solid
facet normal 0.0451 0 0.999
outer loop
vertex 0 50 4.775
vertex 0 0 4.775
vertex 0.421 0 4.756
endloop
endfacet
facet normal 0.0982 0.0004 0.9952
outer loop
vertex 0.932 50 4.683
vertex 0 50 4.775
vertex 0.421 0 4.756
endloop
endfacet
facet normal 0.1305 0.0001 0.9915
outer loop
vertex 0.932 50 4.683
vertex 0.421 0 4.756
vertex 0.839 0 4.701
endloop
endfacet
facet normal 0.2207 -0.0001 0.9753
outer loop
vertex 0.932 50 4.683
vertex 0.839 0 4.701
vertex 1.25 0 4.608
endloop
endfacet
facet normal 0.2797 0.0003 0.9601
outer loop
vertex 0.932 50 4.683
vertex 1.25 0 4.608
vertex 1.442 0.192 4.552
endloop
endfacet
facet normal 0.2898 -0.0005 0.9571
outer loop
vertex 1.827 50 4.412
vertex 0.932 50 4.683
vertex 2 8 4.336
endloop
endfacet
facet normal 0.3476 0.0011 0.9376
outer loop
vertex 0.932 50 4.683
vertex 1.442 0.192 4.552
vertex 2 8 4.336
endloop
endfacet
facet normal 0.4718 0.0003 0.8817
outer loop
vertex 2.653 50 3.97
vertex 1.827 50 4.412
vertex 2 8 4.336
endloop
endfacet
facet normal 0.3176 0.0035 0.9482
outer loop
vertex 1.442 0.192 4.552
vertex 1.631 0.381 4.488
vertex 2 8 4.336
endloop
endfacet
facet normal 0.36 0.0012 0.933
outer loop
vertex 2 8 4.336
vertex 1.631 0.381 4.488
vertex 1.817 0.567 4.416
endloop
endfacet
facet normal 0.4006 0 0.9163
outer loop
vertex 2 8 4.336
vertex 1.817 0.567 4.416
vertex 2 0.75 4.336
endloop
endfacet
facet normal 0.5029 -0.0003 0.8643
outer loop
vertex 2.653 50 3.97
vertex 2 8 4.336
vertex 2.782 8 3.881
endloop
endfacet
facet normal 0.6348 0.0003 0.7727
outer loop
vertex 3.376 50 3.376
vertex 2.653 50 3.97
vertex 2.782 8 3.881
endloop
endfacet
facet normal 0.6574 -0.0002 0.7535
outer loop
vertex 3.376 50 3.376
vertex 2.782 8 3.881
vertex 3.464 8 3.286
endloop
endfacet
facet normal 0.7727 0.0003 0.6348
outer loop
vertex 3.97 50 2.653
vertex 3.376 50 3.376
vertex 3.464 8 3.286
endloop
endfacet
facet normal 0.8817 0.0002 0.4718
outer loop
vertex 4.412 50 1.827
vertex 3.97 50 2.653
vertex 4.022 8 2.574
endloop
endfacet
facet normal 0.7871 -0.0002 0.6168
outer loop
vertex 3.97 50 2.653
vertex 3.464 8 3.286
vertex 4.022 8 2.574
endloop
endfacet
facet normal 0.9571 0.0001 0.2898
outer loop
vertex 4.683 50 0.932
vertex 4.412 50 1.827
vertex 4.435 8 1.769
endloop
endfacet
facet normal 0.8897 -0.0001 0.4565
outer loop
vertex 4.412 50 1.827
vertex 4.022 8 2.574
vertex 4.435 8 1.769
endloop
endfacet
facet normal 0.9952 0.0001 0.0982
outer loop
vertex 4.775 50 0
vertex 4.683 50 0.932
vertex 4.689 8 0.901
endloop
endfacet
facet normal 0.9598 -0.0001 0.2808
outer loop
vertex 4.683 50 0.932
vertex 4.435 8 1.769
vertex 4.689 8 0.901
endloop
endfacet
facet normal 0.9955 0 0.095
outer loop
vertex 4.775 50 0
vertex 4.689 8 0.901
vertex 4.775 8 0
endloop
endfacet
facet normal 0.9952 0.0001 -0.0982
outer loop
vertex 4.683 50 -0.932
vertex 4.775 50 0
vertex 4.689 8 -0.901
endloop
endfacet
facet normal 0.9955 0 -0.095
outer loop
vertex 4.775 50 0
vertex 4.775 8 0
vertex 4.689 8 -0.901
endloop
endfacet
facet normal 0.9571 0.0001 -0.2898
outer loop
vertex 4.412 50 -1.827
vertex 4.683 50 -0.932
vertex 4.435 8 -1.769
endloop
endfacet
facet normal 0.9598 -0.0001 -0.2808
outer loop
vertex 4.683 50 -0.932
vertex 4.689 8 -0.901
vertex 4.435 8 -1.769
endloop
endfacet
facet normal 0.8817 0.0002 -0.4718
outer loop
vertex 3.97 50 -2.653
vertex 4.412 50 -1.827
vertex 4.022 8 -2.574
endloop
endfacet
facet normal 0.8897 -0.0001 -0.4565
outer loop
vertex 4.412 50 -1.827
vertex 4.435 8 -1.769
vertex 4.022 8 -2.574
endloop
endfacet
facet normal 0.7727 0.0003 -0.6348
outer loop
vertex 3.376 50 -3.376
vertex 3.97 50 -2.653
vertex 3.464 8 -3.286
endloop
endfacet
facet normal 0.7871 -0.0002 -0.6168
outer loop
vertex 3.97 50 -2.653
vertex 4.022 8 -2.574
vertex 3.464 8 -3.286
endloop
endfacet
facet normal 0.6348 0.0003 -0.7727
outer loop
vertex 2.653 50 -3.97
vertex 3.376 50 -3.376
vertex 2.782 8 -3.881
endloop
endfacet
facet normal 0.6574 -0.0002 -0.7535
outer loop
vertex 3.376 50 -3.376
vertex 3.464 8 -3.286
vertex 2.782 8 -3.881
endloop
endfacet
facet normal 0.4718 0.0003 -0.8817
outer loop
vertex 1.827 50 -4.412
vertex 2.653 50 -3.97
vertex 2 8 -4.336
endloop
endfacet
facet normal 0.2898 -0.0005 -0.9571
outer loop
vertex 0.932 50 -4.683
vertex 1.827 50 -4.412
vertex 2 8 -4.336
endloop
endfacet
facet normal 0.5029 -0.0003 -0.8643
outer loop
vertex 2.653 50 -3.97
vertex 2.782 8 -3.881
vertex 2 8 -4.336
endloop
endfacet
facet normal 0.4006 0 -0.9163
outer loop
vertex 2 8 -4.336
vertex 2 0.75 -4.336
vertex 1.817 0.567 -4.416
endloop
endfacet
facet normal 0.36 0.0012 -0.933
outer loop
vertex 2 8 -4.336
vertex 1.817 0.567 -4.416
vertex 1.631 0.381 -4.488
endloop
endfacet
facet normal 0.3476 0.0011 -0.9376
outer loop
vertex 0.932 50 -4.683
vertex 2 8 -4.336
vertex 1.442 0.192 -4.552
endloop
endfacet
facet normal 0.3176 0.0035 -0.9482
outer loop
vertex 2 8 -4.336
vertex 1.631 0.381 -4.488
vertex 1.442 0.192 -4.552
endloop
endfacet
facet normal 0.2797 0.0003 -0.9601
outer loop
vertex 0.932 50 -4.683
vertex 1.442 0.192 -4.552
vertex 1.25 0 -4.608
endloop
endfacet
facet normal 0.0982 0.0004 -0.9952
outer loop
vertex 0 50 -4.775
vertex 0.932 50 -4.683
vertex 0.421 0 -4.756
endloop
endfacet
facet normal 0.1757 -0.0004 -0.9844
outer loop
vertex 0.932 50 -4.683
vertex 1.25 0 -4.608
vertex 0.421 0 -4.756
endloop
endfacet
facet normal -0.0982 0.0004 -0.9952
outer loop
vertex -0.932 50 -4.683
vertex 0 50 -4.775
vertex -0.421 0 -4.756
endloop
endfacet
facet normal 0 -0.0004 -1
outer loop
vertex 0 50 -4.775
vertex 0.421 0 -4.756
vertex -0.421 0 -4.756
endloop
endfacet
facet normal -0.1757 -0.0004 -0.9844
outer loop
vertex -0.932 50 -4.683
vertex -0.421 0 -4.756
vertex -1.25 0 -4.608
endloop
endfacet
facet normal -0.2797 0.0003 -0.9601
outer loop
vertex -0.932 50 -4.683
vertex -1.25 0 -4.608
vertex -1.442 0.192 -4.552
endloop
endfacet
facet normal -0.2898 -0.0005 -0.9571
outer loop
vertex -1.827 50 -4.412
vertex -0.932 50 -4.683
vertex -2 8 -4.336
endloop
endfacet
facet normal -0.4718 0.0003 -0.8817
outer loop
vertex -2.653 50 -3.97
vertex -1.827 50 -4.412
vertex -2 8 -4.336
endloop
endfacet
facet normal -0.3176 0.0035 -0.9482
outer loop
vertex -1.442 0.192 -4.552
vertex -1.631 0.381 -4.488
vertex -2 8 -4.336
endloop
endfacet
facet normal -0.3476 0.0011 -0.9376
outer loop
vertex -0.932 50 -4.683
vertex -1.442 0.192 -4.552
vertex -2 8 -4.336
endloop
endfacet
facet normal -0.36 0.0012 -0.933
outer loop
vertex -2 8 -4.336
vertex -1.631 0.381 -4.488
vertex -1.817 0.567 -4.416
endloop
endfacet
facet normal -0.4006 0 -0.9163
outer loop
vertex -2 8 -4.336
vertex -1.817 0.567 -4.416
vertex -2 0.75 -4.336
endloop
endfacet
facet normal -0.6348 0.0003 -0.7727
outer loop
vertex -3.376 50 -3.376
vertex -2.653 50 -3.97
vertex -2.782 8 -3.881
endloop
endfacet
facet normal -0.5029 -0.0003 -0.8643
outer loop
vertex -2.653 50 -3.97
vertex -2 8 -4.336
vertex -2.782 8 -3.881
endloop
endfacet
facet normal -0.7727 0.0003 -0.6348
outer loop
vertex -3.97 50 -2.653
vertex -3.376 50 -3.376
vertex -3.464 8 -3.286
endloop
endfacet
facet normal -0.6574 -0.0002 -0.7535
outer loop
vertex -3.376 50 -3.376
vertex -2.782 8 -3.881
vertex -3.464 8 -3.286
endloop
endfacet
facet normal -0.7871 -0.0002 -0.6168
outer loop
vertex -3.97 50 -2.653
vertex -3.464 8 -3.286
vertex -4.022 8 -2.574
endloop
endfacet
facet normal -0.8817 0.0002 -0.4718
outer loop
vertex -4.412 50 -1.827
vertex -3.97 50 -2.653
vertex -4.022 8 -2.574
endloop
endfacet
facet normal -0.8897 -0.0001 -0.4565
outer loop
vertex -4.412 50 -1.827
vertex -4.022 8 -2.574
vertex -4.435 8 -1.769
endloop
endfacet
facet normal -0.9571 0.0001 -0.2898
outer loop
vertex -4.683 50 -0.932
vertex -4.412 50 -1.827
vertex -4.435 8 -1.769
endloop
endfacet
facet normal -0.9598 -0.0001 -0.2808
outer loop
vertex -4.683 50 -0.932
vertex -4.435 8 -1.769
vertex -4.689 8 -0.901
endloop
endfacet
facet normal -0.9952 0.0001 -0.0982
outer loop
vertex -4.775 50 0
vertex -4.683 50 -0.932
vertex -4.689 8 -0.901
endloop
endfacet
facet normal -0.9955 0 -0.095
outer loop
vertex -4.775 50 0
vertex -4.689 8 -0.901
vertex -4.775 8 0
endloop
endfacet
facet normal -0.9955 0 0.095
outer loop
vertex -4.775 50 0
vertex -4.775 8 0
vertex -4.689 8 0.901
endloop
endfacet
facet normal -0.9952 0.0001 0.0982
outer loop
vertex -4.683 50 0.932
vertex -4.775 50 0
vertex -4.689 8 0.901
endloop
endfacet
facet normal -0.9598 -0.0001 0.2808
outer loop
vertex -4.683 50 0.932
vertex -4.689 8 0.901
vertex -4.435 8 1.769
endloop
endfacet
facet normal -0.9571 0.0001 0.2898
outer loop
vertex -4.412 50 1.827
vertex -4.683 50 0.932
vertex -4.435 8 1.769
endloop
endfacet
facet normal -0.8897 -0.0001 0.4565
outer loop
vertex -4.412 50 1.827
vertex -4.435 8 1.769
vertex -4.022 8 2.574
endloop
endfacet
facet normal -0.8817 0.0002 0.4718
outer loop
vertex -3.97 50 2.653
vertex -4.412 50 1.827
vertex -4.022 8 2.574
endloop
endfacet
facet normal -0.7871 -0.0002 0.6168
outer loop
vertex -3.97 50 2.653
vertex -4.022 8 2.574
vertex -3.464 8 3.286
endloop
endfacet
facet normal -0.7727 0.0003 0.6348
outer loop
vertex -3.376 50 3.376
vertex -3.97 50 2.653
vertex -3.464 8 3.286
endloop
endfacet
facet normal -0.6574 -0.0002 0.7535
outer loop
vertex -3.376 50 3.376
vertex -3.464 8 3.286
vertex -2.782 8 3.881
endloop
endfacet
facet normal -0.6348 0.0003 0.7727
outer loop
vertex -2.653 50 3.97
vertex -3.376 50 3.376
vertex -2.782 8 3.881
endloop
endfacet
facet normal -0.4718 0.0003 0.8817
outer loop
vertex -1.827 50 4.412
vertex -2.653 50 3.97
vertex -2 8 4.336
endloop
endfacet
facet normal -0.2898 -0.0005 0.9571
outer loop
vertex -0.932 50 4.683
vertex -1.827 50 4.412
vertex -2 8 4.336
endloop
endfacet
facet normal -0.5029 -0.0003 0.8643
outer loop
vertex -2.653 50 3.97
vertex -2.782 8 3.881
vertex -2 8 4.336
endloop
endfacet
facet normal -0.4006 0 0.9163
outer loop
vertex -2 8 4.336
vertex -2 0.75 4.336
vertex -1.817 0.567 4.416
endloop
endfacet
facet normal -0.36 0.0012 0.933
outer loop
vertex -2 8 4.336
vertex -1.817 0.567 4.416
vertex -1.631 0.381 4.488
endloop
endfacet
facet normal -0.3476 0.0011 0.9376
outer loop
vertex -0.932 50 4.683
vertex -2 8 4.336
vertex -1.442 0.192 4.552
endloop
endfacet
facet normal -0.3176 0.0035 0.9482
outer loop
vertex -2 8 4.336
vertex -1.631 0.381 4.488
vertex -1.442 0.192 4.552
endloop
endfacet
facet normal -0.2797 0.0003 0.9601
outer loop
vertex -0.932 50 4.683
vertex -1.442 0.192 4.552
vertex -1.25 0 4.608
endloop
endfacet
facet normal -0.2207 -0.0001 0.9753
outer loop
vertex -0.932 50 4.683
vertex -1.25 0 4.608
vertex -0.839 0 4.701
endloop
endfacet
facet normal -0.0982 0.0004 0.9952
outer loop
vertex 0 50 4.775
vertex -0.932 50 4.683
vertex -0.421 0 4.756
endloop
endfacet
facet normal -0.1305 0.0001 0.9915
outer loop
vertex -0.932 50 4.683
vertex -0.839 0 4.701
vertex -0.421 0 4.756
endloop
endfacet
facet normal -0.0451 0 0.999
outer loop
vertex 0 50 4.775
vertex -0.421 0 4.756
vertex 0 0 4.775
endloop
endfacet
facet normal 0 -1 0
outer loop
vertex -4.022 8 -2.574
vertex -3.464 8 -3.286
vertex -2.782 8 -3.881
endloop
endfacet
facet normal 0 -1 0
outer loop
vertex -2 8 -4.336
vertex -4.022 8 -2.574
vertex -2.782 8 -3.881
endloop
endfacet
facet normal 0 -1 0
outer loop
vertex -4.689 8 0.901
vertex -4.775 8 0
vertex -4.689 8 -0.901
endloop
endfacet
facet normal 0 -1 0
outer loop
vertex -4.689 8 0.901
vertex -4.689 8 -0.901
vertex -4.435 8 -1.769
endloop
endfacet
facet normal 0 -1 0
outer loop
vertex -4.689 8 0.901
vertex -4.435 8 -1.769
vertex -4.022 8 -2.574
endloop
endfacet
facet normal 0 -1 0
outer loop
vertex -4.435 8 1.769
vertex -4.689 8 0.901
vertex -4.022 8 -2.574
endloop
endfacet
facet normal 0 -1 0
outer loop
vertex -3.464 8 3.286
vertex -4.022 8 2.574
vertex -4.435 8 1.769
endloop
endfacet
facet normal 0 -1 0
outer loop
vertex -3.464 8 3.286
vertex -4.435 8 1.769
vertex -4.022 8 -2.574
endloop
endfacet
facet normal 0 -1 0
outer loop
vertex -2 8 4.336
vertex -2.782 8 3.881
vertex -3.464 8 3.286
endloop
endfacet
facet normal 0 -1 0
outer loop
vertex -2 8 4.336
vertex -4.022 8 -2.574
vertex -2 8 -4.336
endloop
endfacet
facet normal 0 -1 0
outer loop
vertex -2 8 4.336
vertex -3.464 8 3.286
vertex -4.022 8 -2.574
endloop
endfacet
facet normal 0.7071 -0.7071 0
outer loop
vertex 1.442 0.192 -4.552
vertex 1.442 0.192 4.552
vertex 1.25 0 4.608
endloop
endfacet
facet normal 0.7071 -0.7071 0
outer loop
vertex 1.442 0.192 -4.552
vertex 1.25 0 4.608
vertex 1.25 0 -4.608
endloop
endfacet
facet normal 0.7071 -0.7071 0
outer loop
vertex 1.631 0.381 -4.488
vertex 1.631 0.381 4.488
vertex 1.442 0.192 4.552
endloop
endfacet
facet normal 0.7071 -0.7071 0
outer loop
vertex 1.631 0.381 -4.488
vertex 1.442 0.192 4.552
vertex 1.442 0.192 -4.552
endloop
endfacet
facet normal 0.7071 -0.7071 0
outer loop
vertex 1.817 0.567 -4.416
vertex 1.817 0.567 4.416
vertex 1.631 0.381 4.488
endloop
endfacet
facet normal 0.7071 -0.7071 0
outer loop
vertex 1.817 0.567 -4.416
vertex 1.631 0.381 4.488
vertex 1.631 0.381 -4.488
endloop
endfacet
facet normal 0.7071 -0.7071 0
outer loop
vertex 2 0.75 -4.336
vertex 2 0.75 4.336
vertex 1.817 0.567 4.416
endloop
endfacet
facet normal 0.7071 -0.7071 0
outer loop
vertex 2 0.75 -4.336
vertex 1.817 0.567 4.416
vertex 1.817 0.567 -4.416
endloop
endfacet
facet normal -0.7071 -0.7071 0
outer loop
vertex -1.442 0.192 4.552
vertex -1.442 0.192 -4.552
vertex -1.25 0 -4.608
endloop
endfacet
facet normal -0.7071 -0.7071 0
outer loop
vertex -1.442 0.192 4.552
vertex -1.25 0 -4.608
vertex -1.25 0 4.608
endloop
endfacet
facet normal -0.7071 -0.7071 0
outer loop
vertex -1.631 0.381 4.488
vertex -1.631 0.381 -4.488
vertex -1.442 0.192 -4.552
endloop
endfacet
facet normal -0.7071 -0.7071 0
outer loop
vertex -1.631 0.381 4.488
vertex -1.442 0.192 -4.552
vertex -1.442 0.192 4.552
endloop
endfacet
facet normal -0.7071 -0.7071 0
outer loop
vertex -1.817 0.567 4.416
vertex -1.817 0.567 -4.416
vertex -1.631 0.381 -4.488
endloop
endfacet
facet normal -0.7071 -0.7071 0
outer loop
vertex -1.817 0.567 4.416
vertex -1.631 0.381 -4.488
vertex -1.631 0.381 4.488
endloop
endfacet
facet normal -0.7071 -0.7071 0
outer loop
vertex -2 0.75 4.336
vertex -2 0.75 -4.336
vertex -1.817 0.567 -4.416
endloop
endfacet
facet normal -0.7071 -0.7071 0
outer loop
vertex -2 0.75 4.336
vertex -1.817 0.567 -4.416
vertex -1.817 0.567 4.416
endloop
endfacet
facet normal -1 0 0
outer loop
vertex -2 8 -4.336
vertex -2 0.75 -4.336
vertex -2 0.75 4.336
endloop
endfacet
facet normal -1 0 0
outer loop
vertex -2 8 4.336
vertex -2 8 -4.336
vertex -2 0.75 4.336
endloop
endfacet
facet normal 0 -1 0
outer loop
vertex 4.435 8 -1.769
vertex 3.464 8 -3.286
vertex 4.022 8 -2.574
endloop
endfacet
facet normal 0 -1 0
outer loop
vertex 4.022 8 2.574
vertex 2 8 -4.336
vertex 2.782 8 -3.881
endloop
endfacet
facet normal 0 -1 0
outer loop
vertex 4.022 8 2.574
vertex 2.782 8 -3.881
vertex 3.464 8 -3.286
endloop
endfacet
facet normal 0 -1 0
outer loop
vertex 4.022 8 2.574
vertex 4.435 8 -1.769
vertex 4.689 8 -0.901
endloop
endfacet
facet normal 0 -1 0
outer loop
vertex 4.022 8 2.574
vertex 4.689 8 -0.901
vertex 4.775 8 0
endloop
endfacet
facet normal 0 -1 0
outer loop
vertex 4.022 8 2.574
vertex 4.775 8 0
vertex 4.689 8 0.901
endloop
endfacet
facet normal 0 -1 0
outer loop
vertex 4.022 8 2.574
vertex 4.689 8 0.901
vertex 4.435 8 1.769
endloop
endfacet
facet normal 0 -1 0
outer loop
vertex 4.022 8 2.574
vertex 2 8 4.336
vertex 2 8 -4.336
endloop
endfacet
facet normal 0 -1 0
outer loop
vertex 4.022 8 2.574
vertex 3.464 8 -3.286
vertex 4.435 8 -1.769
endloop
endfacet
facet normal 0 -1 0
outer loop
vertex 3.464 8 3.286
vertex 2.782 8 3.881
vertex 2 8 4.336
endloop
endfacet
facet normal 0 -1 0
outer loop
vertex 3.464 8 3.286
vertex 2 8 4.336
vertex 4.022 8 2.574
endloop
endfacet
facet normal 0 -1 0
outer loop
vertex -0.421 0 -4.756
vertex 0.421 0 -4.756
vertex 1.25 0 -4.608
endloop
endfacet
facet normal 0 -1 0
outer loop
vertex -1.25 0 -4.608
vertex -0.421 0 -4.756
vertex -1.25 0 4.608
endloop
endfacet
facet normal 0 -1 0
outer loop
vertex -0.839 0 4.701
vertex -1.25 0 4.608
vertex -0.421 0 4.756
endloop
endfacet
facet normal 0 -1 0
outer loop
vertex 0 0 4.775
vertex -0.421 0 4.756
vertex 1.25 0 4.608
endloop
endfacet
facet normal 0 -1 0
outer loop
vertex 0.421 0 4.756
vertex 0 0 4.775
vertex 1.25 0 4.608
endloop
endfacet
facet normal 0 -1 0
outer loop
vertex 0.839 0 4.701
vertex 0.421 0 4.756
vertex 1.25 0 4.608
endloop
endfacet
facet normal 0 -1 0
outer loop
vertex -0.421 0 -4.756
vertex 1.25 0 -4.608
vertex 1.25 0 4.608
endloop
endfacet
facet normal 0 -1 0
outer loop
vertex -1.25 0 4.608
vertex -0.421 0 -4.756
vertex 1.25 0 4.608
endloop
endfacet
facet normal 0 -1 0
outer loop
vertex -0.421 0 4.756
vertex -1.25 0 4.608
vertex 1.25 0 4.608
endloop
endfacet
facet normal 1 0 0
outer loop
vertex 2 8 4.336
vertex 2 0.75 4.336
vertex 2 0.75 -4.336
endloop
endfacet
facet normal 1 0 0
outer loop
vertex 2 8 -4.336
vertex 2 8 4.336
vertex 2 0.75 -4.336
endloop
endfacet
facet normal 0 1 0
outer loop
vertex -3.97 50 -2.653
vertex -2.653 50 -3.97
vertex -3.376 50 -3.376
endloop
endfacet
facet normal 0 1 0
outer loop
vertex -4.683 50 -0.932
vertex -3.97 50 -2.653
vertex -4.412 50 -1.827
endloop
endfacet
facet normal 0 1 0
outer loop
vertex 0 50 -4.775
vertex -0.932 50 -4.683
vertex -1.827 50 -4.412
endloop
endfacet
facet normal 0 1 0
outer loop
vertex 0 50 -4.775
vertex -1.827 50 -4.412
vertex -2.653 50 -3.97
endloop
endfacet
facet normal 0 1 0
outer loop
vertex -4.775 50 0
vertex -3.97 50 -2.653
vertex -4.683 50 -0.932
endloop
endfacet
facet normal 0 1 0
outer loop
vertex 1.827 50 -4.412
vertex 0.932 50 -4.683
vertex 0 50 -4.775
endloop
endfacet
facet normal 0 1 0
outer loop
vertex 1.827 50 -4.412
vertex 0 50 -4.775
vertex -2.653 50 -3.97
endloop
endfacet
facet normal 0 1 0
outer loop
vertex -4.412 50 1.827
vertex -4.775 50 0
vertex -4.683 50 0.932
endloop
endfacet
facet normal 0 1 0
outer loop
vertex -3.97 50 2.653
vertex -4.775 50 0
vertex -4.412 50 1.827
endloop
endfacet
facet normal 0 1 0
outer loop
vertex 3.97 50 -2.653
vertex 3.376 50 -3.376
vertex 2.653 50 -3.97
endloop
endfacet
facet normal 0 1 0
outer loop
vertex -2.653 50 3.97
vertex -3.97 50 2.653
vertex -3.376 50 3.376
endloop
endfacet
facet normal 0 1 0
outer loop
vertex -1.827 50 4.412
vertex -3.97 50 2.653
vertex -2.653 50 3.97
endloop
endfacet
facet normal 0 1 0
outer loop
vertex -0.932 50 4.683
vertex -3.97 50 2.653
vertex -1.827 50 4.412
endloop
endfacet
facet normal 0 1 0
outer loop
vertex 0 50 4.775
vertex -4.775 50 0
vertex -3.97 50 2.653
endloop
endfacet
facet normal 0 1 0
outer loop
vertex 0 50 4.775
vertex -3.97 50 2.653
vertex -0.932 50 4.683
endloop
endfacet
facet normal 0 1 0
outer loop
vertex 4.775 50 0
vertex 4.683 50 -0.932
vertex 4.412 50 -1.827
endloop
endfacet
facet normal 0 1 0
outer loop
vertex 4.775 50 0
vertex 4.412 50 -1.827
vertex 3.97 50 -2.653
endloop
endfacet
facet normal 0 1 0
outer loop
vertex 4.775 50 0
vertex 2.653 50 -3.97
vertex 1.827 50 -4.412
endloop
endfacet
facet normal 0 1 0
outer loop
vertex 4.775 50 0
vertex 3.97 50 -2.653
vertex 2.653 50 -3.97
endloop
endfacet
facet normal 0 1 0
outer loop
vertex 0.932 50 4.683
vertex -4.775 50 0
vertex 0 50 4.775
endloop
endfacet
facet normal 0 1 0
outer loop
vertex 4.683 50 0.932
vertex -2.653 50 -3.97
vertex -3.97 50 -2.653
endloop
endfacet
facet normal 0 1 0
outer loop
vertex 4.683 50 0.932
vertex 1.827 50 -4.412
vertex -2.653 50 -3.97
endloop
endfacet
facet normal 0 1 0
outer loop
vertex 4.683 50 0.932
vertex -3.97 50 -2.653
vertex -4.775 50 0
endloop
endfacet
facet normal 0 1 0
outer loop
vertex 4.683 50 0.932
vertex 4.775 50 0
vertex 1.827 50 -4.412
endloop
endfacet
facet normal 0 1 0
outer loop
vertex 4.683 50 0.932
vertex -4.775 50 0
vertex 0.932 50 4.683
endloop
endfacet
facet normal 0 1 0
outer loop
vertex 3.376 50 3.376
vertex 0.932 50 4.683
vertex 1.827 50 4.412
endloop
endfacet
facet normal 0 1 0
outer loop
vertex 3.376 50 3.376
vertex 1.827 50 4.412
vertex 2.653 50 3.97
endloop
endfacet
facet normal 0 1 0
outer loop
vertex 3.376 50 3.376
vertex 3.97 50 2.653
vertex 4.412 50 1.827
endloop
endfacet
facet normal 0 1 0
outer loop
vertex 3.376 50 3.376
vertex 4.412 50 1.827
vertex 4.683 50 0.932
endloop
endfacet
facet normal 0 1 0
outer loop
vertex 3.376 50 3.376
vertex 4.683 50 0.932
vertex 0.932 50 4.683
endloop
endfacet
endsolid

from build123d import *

# Parameters (mm, degrees)
SKETCH1_R           = 4.775
BOSS_EXTRUDE1_DEPTH = 50
CUT_EXTRUDE2_DEPTH  = 8
CHAMFER2_SIZE       = 0.75


with BuildPart() as part:
    # Sketch1 → Boss-Extrude1 (new body)
    with BuildSketch(Plane(origin=(0, 0, 0), x_dir=(1, 0, 0), z_dir=(0, 1, 0))):
        with Locations(Location((0, 0, 0), (0, 0, 270))):
            Circle(SKETCH1_R)
    extrude(amount=BOSS_EXTRUDE1_DEPTH)

    # Sketch3 → Cut-Extrude2 (cut)
    with BuildSketch(Plane.XZ):
        with BuildLine():
            ThreePointArc((5.7947785, 0), (4.752316007, 3.315863452), (2, 5.438700016))
            Line((2, 5.438700016), (2, 4.33596875))
            ThreePointArc((2, 4.33596875), (4.021854361, 2.57396824), (4.775, 0))
            ThreePointArc((4.775, 0), (4.021854361, -2.57396824), (2, -4.33596875))
            Line((2, -4.33596875), (2, -5.438700016))
            ThreePointArc((2, -5.438700016), (4.752316007, -3.315863452), (5.7947785, 0))
        make_face()
        with BuildLine():
            ThreePointArc((4.775, 0), (4.021854361, 2.57396824), (2, 4.33596875))
            Line((2, 4.33596875), (2, -4.33596875))
            ThreePointArc((2, -4.33596875), (4.021854361, -2.57396824), (4.775, 0))
        make_face()
        with BuildLine():
            Line((-2, -4.33596875), (-2, 4.33596875))
            ThreePointArc((-2, 4.33596875), (-4.775, 0), (-2, -4.33596875))
        make_face()
        with BuildLine():
            Line((-2, 4.33596875), (-2, 5.438700016))
            ThreePointArc((-2, 5.438700016), (-5.7947785, 0), (-2, -5.438700016))
            Line((-2, -5.438700016), (-2, -4.33596875))
            ThreePointArc((-2, -4.33596875), (-4.775, 0), (-2, 4.33596875))
        make_face()
    extrude(amount=-CUT_EXTRUDE2_DEPTH, mode=Mode.SUBTRACT)

    # Chamfer2
    chamfer2_edges = [part.edges().sort_by_distance(p)[0] for p in [
        (-2, 0, 0),
        (2, 0, 0),
    ]]
    chamfer(chamfer2_edges, length=CHAMFER2_SIZE)


solid = part.part
